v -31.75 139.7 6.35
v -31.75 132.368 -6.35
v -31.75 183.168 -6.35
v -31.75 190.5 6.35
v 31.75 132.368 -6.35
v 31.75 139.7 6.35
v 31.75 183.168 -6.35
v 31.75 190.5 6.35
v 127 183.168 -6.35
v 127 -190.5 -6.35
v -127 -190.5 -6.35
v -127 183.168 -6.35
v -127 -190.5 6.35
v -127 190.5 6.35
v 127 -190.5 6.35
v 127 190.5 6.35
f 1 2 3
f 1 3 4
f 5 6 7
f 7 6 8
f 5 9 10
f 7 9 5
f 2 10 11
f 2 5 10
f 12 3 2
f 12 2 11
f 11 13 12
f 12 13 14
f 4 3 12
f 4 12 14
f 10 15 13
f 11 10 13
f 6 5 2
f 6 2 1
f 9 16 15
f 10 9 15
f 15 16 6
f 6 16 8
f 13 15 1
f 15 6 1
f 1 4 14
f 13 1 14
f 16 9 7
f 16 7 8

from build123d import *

# Parameters (mm, degrees)
BOSS_EXTRUDE1_DEPTH = 6.35
CUT_EXTRUDE1_DEPTH  = 31.75
CUT_EXTRUDE2_DEPTH  = 127


with BuildPart() as part:
    # Sketch1 → Boss-Extrude1 (new, symmetric)
    with BuildSketch(Plane.XY):
        Polygon((127, -190.5), (-127, -190.5), (-127, 190.5), (-31.75, 190.5), (-31.75, 139.7), (31.75, 139.7), (31.75, 190.5), (127, 190.5), align=None)
    extrude(amount=BOSS_EXTRUDE1_DEPTH, both=True)

    # Sketch4 → Cut-Extrude1 (cut, symmetric)
    with BuildSketch(Plane(origin=(0, 0, 0), x_dir=(0, 0, -1), z_dir=(1, 0, 0))):
        Polygon((-6.35, 139.7), (6.35, 139.7), (6.35, 132.367651581), align=None)
        Polygon((-6.35, 190.5), (6.35, 190.5), (6.35, 183.167651581), align=None)
    extrude(amount=CUT_EXTRUDE1_DEPTH, both=True, mode=Mode.SUBTRACT)

    # Sketch5 → Cut-Extrude2 (cut, symmetric)
    with BuildSketch(Plane(origin=(0, 0, 0), x_dir=(0, 0, -1), z_dir=(1, 0, 0))):
        Polygon((-6.35, 190.5), (6.35, 190.5), (6.35, 183.167651581), align=None)
    extrude(amount=CUT_EXTRUDE2_DEPTH, both=True, mode=Mode.SUBTRACT)


solid = part.part
